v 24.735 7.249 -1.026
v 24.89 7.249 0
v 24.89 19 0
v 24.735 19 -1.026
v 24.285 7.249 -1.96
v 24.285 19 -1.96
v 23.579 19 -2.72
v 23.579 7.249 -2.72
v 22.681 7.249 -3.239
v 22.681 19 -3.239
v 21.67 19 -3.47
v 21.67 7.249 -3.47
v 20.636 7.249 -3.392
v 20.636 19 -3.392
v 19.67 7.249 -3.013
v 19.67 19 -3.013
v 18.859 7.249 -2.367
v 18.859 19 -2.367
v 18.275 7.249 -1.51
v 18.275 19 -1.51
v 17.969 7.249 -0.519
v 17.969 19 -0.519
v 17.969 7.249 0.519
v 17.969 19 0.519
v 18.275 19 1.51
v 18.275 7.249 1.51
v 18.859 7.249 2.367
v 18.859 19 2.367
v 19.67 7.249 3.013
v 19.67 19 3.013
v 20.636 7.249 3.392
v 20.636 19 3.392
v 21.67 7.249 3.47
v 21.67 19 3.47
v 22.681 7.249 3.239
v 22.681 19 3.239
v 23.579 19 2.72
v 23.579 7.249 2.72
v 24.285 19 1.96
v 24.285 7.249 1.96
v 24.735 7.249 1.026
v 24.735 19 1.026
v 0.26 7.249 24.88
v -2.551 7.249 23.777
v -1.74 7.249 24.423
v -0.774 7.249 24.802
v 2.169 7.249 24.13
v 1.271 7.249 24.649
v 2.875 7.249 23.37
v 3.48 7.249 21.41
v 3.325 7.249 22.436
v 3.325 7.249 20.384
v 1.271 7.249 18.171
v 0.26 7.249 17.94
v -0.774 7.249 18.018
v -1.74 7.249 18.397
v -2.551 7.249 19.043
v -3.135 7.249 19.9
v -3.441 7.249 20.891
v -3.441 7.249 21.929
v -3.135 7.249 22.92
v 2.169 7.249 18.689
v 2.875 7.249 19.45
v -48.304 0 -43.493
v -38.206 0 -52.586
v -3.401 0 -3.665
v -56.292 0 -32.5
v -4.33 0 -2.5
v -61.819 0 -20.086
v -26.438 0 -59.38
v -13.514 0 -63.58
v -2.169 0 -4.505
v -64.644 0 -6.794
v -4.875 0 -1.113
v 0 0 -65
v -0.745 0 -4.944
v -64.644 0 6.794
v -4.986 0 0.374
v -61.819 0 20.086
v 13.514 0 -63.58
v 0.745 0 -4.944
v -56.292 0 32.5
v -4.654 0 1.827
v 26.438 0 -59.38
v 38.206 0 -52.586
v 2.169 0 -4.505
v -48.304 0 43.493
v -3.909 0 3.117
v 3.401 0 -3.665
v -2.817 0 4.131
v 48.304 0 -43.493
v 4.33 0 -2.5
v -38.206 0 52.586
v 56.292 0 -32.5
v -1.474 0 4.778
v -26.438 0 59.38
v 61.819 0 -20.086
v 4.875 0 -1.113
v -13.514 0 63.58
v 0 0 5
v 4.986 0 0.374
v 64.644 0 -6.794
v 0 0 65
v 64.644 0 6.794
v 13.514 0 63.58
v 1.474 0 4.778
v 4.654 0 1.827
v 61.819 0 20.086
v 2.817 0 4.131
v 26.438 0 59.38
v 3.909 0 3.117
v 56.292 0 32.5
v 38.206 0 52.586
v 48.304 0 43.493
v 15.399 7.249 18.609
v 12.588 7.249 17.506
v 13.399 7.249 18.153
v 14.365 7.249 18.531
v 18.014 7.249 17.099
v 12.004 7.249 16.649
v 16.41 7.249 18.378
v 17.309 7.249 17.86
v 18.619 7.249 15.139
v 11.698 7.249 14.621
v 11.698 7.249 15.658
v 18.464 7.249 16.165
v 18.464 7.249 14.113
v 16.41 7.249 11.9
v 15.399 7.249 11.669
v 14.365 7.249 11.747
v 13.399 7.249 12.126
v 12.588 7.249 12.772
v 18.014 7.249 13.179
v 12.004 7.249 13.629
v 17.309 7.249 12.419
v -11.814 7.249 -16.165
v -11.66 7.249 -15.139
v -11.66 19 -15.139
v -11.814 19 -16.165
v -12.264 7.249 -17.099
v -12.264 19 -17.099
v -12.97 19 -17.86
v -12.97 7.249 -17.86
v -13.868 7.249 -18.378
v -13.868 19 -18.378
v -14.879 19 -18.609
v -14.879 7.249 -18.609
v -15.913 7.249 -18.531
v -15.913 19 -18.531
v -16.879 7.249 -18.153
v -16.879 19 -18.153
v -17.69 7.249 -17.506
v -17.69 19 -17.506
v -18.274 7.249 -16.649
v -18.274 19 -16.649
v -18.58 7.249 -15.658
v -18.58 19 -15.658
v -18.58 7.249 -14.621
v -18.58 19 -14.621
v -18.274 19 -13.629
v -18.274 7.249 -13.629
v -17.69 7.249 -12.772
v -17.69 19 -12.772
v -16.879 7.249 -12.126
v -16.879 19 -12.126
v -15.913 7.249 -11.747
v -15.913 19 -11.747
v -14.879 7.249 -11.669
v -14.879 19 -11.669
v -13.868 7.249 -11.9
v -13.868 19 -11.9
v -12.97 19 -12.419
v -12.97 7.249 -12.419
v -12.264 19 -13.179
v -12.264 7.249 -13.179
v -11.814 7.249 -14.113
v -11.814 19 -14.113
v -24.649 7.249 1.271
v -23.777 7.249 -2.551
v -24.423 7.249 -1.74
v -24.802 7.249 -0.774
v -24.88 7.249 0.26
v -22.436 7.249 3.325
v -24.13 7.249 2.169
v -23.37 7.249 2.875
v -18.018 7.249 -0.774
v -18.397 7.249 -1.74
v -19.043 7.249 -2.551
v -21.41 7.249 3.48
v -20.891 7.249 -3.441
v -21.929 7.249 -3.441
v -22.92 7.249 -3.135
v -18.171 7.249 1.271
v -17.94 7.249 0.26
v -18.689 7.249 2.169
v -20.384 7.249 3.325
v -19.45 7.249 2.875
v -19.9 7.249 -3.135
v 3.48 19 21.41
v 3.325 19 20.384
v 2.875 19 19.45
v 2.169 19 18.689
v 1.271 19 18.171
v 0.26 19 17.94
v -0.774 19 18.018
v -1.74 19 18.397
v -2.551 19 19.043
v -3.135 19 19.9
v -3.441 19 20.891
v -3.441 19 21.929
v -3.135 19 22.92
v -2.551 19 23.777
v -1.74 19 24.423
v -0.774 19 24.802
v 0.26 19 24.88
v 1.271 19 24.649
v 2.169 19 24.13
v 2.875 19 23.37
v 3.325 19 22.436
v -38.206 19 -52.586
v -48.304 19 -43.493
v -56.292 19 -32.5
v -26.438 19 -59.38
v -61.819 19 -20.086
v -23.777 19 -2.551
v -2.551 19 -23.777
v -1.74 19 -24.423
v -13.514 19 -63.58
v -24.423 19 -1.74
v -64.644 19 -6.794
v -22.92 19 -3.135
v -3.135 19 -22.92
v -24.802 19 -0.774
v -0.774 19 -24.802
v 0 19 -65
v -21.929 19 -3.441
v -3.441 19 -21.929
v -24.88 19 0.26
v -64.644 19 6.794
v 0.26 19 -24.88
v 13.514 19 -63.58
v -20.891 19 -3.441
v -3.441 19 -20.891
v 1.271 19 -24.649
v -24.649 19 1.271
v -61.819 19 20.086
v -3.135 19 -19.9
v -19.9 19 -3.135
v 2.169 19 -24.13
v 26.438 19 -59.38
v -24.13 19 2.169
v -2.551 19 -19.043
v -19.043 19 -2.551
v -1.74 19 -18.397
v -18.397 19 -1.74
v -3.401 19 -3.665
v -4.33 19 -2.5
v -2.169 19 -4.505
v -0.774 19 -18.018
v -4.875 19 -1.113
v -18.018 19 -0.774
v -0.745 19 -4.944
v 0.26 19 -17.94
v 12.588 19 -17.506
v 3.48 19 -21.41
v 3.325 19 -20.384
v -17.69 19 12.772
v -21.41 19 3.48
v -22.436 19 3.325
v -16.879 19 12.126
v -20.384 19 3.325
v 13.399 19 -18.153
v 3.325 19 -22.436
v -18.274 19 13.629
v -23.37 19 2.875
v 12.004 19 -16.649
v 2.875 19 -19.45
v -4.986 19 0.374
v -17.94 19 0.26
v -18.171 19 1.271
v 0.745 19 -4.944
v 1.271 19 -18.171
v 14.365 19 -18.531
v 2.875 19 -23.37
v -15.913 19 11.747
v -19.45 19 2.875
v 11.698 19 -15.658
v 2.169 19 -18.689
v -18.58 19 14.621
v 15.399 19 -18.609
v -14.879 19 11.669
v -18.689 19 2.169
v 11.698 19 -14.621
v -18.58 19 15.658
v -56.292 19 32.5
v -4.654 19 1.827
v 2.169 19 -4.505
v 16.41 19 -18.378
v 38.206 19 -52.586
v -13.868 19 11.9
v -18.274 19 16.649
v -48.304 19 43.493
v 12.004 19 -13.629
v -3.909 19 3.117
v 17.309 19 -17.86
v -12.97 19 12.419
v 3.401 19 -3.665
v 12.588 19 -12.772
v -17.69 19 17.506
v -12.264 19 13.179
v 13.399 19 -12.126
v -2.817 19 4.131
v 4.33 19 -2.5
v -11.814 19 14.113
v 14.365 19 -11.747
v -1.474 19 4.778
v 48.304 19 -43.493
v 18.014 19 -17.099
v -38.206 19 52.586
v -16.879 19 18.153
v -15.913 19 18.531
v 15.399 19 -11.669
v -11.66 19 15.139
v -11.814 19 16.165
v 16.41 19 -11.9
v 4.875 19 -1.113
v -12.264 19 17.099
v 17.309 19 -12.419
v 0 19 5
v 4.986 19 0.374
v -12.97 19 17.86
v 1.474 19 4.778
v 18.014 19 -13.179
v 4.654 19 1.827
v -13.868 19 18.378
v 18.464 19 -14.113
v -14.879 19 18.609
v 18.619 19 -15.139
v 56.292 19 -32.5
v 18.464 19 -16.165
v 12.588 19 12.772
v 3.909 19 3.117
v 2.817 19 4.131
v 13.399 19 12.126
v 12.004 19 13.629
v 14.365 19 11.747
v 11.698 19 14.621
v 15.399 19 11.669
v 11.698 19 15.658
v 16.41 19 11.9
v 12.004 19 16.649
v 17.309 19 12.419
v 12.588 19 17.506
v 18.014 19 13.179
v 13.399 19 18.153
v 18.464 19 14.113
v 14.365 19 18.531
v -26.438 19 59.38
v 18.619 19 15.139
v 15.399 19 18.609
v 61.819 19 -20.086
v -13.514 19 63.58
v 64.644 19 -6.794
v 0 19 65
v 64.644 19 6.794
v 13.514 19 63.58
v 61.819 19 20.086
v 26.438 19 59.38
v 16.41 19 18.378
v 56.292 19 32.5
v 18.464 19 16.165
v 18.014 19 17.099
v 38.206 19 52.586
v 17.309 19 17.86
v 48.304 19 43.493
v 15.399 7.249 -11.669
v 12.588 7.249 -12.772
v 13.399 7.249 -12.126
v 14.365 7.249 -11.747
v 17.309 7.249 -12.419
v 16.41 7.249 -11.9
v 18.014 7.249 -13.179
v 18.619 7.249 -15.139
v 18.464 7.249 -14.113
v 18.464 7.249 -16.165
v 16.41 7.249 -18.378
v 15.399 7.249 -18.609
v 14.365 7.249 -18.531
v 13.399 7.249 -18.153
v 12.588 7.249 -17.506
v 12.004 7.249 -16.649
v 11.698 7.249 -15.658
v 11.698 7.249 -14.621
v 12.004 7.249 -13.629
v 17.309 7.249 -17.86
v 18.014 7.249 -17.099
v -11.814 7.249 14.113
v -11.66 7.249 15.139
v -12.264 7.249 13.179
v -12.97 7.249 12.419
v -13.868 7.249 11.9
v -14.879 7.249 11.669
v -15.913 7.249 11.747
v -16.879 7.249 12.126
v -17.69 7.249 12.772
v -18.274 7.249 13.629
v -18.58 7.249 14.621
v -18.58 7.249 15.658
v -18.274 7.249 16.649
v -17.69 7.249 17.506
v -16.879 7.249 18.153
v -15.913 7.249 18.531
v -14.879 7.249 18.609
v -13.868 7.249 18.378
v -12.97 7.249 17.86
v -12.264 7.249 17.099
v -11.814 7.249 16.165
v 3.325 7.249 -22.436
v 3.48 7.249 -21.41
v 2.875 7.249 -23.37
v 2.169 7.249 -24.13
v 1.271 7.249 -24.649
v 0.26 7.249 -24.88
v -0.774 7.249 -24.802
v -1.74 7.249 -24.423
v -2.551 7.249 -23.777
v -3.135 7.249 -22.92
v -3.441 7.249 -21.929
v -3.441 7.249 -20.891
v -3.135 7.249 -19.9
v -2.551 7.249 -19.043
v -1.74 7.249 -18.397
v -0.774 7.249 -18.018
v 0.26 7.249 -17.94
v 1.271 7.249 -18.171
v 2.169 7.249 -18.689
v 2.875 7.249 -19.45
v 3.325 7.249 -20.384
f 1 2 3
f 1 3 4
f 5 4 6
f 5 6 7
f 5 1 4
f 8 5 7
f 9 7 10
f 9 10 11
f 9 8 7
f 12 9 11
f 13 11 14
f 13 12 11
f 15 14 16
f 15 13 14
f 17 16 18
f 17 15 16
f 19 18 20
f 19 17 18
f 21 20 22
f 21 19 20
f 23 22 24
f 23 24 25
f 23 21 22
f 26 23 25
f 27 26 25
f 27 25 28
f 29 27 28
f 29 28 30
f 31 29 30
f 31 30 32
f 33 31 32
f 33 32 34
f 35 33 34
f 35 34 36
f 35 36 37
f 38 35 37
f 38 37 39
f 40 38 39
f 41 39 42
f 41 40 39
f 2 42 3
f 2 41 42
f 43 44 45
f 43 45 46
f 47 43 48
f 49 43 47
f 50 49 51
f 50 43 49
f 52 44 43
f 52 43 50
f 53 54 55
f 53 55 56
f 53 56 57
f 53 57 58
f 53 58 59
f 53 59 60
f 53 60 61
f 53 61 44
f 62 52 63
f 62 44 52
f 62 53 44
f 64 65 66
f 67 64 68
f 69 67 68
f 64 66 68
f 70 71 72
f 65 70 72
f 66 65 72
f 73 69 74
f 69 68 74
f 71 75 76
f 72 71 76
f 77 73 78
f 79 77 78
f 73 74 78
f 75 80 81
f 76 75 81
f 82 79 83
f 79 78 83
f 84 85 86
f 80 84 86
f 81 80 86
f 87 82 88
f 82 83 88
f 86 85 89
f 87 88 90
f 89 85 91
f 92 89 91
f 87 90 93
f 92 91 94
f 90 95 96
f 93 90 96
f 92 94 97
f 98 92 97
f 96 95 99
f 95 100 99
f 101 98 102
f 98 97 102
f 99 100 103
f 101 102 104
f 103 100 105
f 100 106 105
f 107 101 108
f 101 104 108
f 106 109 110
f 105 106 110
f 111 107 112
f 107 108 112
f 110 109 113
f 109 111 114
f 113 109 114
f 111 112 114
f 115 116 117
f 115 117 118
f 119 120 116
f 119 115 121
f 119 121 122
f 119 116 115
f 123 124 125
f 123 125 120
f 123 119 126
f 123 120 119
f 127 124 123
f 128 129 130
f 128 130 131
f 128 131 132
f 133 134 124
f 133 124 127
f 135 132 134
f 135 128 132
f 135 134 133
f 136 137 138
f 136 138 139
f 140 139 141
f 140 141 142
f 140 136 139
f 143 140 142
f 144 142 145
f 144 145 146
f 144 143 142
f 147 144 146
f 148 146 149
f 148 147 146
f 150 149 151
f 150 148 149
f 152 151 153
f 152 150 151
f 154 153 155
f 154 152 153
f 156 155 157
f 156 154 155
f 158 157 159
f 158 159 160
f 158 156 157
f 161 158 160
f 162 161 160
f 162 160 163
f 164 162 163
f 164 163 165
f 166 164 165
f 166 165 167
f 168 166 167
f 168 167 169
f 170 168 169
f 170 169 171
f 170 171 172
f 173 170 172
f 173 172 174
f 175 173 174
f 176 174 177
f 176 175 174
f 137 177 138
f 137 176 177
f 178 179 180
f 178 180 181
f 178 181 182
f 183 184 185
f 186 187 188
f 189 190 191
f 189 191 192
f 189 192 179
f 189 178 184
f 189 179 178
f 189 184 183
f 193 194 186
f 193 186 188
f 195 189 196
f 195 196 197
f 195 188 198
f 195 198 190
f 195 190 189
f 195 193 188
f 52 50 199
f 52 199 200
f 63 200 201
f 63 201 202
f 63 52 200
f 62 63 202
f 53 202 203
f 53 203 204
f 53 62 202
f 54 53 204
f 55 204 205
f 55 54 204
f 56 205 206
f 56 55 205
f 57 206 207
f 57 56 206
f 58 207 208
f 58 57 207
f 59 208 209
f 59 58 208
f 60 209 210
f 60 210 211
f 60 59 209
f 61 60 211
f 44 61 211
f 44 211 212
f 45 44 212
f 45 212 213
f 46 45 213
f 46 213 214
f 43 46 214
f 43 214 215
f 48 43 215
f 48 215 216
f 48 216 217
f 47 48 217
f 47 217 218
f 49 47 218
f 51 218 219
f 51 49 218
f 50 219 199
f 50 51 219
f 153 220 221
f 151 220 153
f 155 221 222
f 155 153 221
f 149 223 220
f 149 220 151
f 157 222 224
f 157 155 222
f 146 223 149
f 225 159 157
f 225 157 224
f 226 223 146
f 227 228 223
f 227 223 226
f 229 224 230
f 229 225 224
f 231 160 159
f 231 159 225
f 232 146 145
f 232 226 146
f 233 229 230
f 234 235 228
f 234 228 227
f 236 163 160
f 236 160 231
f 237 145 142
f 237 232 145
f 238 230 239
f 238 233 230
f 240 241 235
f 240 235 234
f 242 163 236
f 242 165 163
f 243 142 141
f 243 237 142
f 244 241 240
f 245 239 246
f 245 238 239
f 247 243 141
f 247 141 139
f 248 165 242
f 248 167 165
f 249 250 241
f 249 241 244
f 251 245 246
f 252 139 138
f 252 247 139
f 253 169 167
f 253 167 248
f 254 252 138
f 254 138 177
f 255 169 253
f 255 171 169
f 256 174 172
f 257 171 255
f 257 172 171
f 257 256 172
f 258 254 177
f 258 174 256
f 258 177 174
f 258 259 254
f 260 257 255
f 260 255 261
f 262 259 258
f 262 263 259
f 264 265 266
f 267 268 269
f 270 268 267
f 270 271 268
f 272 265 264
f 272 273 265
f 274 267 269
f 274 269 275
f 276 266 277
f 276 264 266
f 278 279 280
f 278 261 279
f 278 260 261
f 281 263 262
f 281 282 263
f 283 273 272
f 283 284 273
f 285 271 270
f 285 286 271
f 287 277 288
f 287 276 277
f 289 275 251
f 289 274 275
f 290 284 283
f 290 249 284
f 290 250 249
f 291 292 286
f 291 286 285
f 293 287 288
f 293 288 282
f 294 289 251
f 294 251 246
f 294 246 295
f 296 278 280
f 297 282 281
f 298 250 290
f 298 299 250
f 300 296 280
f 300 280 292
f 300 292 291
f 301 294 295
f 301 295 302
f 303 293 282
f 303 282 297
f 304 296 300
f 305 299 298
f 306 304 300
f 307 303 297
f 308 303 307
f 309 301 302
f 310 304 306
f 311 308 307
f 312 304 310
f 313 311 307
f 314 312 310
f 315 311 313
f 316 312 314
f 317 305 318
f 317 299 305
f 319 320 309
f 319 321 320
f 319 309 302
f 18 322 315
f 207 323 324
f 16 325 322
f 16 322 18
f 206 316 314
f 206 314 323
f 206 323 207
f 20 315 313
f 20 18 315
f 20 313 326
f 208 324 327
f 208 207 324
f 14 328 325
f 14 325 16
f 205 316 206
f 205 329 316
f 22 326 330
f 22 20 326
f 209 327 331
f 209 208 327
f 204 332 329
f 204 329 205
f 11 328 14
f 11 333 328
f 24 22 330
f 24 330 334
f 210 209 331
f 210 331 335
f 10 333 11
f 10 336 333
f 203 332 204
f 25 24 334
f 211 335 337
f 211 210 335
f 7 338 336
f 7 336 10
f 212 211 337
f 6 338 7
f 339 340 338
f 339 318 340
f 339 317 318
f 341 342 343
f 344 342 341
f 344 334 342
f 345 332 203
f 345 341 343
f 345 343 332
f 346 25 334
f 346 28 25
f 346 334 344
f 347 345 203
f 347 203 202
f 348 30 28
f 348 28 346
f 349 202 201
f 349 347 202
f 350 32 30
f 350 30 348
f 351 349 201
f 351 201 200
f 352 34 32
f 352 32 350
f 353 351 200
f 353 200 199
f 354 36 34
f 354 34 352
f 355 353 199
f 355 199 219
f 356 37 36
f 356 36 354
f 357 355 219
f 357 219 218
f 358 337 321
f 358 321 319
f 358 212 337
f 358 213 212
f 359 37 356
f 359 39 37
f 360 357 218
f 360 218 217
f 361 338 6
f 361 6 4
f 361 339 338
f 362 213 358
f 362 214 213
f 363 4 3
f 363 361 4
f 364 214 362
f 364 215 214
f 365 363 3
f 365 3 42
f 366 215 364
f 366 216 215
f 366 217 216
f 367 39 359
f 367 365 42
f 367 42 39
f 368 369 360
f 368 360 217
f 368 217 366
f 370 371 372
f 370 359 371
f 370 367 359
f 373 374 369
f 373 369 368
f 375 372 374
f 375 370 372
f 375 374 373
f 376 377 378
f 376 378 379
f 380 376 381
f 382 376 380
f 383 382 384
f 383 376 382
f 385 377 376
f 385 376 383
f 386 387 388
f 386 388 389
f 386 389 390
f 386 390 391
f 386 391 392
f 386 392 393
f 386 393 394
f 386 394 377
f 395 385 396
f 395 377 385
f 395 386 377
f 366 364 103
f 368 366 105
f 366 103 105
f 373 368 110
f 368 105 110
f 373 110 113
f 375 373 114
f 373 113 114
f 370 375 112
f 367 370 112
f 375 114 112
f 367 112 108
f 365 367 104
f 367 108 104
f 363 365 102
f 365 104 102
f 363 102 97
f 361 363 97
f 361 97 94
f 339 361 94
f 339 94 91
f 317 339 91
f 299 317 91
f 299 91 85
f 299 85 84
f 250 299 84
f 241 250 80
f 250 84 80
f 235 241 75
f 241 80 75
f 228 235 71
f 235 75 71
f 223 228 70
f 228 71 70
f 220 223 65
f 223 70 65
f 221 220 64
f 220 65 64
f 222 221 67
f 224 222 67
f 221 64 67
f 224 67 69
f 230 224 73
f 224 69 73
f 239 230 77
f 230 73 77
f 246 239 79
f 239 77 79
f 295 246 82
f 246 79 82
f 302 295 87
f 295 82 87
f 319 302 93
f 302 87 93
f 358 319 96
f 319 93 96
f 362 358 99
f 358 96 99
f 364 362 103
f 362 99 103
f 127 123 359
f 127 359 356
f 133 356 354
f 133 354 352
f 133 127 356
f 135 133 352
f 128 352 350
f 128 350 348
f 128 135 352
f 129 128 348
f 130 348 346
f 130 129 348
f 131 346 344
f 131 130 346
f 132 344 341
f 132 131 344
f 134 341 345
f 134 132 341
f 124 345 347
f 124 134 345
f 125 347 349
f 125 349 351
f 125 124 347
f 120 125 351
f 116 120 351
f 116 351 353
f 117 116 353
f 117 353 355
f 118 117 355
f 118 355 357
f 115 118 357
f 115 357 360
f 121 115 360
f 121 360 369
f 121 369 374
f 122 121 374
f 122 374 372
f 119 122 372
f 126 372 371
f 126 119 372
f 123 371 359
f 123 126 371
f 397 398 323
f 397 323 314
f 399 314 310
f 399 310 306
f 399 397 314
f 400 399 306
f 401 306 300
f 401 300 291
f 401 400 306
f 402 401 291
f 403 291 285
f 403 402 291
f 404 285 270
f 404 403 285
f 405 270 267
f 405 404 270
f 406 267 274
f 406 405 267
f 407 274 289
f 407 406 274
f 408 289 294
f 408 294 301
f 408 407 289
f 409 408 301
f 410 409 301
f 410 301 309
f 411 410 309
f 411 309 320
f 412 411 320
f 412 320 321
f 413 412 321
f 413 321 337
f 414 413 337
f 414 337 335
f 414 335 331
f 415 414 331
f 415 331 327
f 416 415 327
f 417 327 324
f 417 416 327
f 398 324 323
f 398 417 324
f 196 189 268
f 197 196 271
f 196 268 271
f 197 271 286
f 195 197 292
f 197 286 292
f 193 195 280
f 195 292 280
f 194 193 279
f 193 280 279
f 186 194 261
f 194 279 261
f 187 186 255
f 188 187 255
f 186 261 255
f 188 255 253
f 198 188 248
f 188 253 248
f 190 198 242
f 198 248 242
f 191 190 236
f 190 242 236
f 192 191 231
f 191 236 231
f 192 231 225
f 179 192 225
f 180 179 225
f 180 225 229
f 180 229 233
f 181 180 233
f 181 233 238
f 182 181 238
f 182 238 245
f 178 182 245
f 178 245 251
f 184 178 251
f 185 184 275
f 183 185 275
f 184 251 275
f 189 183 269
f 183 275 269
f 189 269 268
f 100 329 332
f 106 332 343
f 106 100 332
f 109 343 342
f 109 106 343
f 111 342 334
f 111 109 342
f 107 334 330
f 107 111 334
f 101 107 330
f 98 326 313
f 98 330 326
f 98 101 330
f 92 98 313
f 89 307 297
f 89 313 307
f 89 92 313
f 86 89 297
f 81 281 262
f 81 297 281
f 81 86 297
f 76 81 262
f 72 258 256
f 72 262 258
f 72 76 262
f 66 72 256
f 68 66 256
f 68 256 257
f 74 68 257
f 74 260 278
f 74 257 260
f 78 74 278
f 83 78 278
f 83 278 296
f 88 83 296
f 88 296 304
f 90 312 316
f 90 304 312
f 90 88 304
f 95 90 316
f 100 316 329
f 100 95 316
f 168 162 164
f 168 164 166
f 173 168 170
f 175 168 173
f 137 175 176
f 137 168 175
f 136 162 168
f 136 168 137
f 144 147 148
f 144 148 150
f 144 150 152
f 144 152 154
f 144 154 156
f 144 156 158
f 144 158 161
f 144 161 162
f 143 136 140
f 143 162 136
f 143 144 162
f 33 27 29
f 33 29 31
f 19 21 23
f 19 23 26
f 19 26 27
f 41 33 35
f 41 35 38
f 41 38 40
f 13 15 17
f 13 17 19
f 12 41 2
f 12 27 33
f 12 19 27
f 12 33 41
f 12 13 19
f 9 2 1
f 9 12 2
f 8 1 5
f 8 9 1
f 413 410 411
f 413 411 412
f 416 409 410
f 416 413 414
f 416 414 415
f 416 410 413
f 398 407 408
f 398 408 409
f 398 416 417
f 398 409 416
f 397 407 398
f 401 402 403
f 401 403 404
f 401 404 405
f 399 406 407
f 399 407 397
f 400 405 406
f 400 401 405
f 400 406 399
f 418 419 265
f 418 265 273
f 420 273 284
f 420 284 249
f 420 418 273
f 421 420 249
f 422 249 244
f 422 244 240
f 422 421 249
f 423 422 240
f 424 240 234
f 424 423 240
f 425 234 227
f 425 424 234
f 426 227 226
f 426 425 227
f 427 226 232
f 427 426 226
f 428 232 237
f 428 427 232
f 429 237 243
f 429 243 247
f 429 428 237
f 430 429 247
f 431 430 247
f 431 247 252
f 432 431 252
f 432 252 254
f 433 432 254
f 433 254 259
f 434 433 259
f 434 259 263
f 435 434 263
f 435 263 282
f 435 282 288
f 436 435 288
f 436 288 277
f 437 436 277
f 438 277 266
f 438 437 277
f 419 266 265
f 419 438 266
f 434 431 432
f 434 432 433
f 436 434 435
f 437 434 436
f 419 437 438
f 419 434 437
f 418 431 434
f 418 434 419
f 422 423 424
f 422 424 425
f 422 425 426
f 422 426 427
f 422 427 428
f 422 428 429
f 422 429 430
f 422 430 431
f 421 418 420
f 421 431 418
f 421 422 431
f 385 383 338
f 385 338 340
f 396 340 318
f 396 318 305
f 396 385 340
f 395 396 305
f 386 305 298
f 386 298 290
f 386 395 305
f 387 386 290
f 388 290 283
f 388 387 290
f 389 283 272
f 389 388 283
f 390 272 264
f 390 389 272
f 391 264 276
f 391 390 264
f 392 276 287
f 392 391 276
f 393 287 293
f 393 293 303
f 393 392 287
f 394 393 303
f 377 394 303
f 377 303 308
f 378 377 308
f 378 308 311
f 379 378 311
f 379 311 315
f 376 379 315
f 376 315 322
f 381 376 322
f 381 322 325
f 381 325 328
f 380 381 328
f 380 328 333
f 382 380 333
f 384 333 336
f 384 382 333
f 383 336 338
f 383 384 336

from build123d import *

# Parameters (mm, degrees)
SKETCH1_R           = 65
BOSS_EXTRUDE1_DEPTH = 19
SKETCH2_R           = 5
CUT_EXTRUDE1_DEPTH  = 94.866927083
SKETCH3_R           = 3.479573806
CUT_EXTRUDE2_DEPTH  = 11.750950787
CIRPATTERN1_COUNT   = 8


with BuildPart() as part:
    # Sketch1 → Boss-Extrude1 (new body)
    with BuildSketch(Plane(origin=(0, 0, 0), x_dir=(1, 0, 0), z_dir=(0, 1, 0))):
        Circle(SKETCH1_R)
    extrude(amount=BOSS_EXTRUDE1_DEPTH)

    # Sketch2 → Cut-Extrude1 (cut, through all)
    with BuildSketch(Plane(origin=(0, 0, 0), x_dir=(1, 0, 0), z_dir=(0, 1, 0))):
        Circle(SKETCH2_R)
    extrude(amount=CUT_EXTRUDE1_DEPTH, mode=Mode.SUBTRACT)

    # Sketch3 → Cut-Extrude2 (cut)
    with BuildSketch(Plane(origin=(0, 19, 0), x_dir=(1, 0, 0), z_dir=(0, 1, 0))):
        with Locations((-21.40993498, 0)):
            Circle(SKETCH3_R)
    cut_extrude2 = extrude(amount=-CUT_EXTRUDE2_DEPTH, mode=Mode.SUBTRACT)

    # CirPattern1: Cut-Extrude2 ×8 about axis
    cirpattern1_axis = Axis((0, 0, 0), (0, 1, 0))
    for i in range(1, CIRPATTERN1_COUNT):
        add(cut_extrude2.rotate(cirpattern1_axis, i * 360 / CIRPATTERN1_COUNT), mode=Mode.SUBTRACT)


solid = part.part
